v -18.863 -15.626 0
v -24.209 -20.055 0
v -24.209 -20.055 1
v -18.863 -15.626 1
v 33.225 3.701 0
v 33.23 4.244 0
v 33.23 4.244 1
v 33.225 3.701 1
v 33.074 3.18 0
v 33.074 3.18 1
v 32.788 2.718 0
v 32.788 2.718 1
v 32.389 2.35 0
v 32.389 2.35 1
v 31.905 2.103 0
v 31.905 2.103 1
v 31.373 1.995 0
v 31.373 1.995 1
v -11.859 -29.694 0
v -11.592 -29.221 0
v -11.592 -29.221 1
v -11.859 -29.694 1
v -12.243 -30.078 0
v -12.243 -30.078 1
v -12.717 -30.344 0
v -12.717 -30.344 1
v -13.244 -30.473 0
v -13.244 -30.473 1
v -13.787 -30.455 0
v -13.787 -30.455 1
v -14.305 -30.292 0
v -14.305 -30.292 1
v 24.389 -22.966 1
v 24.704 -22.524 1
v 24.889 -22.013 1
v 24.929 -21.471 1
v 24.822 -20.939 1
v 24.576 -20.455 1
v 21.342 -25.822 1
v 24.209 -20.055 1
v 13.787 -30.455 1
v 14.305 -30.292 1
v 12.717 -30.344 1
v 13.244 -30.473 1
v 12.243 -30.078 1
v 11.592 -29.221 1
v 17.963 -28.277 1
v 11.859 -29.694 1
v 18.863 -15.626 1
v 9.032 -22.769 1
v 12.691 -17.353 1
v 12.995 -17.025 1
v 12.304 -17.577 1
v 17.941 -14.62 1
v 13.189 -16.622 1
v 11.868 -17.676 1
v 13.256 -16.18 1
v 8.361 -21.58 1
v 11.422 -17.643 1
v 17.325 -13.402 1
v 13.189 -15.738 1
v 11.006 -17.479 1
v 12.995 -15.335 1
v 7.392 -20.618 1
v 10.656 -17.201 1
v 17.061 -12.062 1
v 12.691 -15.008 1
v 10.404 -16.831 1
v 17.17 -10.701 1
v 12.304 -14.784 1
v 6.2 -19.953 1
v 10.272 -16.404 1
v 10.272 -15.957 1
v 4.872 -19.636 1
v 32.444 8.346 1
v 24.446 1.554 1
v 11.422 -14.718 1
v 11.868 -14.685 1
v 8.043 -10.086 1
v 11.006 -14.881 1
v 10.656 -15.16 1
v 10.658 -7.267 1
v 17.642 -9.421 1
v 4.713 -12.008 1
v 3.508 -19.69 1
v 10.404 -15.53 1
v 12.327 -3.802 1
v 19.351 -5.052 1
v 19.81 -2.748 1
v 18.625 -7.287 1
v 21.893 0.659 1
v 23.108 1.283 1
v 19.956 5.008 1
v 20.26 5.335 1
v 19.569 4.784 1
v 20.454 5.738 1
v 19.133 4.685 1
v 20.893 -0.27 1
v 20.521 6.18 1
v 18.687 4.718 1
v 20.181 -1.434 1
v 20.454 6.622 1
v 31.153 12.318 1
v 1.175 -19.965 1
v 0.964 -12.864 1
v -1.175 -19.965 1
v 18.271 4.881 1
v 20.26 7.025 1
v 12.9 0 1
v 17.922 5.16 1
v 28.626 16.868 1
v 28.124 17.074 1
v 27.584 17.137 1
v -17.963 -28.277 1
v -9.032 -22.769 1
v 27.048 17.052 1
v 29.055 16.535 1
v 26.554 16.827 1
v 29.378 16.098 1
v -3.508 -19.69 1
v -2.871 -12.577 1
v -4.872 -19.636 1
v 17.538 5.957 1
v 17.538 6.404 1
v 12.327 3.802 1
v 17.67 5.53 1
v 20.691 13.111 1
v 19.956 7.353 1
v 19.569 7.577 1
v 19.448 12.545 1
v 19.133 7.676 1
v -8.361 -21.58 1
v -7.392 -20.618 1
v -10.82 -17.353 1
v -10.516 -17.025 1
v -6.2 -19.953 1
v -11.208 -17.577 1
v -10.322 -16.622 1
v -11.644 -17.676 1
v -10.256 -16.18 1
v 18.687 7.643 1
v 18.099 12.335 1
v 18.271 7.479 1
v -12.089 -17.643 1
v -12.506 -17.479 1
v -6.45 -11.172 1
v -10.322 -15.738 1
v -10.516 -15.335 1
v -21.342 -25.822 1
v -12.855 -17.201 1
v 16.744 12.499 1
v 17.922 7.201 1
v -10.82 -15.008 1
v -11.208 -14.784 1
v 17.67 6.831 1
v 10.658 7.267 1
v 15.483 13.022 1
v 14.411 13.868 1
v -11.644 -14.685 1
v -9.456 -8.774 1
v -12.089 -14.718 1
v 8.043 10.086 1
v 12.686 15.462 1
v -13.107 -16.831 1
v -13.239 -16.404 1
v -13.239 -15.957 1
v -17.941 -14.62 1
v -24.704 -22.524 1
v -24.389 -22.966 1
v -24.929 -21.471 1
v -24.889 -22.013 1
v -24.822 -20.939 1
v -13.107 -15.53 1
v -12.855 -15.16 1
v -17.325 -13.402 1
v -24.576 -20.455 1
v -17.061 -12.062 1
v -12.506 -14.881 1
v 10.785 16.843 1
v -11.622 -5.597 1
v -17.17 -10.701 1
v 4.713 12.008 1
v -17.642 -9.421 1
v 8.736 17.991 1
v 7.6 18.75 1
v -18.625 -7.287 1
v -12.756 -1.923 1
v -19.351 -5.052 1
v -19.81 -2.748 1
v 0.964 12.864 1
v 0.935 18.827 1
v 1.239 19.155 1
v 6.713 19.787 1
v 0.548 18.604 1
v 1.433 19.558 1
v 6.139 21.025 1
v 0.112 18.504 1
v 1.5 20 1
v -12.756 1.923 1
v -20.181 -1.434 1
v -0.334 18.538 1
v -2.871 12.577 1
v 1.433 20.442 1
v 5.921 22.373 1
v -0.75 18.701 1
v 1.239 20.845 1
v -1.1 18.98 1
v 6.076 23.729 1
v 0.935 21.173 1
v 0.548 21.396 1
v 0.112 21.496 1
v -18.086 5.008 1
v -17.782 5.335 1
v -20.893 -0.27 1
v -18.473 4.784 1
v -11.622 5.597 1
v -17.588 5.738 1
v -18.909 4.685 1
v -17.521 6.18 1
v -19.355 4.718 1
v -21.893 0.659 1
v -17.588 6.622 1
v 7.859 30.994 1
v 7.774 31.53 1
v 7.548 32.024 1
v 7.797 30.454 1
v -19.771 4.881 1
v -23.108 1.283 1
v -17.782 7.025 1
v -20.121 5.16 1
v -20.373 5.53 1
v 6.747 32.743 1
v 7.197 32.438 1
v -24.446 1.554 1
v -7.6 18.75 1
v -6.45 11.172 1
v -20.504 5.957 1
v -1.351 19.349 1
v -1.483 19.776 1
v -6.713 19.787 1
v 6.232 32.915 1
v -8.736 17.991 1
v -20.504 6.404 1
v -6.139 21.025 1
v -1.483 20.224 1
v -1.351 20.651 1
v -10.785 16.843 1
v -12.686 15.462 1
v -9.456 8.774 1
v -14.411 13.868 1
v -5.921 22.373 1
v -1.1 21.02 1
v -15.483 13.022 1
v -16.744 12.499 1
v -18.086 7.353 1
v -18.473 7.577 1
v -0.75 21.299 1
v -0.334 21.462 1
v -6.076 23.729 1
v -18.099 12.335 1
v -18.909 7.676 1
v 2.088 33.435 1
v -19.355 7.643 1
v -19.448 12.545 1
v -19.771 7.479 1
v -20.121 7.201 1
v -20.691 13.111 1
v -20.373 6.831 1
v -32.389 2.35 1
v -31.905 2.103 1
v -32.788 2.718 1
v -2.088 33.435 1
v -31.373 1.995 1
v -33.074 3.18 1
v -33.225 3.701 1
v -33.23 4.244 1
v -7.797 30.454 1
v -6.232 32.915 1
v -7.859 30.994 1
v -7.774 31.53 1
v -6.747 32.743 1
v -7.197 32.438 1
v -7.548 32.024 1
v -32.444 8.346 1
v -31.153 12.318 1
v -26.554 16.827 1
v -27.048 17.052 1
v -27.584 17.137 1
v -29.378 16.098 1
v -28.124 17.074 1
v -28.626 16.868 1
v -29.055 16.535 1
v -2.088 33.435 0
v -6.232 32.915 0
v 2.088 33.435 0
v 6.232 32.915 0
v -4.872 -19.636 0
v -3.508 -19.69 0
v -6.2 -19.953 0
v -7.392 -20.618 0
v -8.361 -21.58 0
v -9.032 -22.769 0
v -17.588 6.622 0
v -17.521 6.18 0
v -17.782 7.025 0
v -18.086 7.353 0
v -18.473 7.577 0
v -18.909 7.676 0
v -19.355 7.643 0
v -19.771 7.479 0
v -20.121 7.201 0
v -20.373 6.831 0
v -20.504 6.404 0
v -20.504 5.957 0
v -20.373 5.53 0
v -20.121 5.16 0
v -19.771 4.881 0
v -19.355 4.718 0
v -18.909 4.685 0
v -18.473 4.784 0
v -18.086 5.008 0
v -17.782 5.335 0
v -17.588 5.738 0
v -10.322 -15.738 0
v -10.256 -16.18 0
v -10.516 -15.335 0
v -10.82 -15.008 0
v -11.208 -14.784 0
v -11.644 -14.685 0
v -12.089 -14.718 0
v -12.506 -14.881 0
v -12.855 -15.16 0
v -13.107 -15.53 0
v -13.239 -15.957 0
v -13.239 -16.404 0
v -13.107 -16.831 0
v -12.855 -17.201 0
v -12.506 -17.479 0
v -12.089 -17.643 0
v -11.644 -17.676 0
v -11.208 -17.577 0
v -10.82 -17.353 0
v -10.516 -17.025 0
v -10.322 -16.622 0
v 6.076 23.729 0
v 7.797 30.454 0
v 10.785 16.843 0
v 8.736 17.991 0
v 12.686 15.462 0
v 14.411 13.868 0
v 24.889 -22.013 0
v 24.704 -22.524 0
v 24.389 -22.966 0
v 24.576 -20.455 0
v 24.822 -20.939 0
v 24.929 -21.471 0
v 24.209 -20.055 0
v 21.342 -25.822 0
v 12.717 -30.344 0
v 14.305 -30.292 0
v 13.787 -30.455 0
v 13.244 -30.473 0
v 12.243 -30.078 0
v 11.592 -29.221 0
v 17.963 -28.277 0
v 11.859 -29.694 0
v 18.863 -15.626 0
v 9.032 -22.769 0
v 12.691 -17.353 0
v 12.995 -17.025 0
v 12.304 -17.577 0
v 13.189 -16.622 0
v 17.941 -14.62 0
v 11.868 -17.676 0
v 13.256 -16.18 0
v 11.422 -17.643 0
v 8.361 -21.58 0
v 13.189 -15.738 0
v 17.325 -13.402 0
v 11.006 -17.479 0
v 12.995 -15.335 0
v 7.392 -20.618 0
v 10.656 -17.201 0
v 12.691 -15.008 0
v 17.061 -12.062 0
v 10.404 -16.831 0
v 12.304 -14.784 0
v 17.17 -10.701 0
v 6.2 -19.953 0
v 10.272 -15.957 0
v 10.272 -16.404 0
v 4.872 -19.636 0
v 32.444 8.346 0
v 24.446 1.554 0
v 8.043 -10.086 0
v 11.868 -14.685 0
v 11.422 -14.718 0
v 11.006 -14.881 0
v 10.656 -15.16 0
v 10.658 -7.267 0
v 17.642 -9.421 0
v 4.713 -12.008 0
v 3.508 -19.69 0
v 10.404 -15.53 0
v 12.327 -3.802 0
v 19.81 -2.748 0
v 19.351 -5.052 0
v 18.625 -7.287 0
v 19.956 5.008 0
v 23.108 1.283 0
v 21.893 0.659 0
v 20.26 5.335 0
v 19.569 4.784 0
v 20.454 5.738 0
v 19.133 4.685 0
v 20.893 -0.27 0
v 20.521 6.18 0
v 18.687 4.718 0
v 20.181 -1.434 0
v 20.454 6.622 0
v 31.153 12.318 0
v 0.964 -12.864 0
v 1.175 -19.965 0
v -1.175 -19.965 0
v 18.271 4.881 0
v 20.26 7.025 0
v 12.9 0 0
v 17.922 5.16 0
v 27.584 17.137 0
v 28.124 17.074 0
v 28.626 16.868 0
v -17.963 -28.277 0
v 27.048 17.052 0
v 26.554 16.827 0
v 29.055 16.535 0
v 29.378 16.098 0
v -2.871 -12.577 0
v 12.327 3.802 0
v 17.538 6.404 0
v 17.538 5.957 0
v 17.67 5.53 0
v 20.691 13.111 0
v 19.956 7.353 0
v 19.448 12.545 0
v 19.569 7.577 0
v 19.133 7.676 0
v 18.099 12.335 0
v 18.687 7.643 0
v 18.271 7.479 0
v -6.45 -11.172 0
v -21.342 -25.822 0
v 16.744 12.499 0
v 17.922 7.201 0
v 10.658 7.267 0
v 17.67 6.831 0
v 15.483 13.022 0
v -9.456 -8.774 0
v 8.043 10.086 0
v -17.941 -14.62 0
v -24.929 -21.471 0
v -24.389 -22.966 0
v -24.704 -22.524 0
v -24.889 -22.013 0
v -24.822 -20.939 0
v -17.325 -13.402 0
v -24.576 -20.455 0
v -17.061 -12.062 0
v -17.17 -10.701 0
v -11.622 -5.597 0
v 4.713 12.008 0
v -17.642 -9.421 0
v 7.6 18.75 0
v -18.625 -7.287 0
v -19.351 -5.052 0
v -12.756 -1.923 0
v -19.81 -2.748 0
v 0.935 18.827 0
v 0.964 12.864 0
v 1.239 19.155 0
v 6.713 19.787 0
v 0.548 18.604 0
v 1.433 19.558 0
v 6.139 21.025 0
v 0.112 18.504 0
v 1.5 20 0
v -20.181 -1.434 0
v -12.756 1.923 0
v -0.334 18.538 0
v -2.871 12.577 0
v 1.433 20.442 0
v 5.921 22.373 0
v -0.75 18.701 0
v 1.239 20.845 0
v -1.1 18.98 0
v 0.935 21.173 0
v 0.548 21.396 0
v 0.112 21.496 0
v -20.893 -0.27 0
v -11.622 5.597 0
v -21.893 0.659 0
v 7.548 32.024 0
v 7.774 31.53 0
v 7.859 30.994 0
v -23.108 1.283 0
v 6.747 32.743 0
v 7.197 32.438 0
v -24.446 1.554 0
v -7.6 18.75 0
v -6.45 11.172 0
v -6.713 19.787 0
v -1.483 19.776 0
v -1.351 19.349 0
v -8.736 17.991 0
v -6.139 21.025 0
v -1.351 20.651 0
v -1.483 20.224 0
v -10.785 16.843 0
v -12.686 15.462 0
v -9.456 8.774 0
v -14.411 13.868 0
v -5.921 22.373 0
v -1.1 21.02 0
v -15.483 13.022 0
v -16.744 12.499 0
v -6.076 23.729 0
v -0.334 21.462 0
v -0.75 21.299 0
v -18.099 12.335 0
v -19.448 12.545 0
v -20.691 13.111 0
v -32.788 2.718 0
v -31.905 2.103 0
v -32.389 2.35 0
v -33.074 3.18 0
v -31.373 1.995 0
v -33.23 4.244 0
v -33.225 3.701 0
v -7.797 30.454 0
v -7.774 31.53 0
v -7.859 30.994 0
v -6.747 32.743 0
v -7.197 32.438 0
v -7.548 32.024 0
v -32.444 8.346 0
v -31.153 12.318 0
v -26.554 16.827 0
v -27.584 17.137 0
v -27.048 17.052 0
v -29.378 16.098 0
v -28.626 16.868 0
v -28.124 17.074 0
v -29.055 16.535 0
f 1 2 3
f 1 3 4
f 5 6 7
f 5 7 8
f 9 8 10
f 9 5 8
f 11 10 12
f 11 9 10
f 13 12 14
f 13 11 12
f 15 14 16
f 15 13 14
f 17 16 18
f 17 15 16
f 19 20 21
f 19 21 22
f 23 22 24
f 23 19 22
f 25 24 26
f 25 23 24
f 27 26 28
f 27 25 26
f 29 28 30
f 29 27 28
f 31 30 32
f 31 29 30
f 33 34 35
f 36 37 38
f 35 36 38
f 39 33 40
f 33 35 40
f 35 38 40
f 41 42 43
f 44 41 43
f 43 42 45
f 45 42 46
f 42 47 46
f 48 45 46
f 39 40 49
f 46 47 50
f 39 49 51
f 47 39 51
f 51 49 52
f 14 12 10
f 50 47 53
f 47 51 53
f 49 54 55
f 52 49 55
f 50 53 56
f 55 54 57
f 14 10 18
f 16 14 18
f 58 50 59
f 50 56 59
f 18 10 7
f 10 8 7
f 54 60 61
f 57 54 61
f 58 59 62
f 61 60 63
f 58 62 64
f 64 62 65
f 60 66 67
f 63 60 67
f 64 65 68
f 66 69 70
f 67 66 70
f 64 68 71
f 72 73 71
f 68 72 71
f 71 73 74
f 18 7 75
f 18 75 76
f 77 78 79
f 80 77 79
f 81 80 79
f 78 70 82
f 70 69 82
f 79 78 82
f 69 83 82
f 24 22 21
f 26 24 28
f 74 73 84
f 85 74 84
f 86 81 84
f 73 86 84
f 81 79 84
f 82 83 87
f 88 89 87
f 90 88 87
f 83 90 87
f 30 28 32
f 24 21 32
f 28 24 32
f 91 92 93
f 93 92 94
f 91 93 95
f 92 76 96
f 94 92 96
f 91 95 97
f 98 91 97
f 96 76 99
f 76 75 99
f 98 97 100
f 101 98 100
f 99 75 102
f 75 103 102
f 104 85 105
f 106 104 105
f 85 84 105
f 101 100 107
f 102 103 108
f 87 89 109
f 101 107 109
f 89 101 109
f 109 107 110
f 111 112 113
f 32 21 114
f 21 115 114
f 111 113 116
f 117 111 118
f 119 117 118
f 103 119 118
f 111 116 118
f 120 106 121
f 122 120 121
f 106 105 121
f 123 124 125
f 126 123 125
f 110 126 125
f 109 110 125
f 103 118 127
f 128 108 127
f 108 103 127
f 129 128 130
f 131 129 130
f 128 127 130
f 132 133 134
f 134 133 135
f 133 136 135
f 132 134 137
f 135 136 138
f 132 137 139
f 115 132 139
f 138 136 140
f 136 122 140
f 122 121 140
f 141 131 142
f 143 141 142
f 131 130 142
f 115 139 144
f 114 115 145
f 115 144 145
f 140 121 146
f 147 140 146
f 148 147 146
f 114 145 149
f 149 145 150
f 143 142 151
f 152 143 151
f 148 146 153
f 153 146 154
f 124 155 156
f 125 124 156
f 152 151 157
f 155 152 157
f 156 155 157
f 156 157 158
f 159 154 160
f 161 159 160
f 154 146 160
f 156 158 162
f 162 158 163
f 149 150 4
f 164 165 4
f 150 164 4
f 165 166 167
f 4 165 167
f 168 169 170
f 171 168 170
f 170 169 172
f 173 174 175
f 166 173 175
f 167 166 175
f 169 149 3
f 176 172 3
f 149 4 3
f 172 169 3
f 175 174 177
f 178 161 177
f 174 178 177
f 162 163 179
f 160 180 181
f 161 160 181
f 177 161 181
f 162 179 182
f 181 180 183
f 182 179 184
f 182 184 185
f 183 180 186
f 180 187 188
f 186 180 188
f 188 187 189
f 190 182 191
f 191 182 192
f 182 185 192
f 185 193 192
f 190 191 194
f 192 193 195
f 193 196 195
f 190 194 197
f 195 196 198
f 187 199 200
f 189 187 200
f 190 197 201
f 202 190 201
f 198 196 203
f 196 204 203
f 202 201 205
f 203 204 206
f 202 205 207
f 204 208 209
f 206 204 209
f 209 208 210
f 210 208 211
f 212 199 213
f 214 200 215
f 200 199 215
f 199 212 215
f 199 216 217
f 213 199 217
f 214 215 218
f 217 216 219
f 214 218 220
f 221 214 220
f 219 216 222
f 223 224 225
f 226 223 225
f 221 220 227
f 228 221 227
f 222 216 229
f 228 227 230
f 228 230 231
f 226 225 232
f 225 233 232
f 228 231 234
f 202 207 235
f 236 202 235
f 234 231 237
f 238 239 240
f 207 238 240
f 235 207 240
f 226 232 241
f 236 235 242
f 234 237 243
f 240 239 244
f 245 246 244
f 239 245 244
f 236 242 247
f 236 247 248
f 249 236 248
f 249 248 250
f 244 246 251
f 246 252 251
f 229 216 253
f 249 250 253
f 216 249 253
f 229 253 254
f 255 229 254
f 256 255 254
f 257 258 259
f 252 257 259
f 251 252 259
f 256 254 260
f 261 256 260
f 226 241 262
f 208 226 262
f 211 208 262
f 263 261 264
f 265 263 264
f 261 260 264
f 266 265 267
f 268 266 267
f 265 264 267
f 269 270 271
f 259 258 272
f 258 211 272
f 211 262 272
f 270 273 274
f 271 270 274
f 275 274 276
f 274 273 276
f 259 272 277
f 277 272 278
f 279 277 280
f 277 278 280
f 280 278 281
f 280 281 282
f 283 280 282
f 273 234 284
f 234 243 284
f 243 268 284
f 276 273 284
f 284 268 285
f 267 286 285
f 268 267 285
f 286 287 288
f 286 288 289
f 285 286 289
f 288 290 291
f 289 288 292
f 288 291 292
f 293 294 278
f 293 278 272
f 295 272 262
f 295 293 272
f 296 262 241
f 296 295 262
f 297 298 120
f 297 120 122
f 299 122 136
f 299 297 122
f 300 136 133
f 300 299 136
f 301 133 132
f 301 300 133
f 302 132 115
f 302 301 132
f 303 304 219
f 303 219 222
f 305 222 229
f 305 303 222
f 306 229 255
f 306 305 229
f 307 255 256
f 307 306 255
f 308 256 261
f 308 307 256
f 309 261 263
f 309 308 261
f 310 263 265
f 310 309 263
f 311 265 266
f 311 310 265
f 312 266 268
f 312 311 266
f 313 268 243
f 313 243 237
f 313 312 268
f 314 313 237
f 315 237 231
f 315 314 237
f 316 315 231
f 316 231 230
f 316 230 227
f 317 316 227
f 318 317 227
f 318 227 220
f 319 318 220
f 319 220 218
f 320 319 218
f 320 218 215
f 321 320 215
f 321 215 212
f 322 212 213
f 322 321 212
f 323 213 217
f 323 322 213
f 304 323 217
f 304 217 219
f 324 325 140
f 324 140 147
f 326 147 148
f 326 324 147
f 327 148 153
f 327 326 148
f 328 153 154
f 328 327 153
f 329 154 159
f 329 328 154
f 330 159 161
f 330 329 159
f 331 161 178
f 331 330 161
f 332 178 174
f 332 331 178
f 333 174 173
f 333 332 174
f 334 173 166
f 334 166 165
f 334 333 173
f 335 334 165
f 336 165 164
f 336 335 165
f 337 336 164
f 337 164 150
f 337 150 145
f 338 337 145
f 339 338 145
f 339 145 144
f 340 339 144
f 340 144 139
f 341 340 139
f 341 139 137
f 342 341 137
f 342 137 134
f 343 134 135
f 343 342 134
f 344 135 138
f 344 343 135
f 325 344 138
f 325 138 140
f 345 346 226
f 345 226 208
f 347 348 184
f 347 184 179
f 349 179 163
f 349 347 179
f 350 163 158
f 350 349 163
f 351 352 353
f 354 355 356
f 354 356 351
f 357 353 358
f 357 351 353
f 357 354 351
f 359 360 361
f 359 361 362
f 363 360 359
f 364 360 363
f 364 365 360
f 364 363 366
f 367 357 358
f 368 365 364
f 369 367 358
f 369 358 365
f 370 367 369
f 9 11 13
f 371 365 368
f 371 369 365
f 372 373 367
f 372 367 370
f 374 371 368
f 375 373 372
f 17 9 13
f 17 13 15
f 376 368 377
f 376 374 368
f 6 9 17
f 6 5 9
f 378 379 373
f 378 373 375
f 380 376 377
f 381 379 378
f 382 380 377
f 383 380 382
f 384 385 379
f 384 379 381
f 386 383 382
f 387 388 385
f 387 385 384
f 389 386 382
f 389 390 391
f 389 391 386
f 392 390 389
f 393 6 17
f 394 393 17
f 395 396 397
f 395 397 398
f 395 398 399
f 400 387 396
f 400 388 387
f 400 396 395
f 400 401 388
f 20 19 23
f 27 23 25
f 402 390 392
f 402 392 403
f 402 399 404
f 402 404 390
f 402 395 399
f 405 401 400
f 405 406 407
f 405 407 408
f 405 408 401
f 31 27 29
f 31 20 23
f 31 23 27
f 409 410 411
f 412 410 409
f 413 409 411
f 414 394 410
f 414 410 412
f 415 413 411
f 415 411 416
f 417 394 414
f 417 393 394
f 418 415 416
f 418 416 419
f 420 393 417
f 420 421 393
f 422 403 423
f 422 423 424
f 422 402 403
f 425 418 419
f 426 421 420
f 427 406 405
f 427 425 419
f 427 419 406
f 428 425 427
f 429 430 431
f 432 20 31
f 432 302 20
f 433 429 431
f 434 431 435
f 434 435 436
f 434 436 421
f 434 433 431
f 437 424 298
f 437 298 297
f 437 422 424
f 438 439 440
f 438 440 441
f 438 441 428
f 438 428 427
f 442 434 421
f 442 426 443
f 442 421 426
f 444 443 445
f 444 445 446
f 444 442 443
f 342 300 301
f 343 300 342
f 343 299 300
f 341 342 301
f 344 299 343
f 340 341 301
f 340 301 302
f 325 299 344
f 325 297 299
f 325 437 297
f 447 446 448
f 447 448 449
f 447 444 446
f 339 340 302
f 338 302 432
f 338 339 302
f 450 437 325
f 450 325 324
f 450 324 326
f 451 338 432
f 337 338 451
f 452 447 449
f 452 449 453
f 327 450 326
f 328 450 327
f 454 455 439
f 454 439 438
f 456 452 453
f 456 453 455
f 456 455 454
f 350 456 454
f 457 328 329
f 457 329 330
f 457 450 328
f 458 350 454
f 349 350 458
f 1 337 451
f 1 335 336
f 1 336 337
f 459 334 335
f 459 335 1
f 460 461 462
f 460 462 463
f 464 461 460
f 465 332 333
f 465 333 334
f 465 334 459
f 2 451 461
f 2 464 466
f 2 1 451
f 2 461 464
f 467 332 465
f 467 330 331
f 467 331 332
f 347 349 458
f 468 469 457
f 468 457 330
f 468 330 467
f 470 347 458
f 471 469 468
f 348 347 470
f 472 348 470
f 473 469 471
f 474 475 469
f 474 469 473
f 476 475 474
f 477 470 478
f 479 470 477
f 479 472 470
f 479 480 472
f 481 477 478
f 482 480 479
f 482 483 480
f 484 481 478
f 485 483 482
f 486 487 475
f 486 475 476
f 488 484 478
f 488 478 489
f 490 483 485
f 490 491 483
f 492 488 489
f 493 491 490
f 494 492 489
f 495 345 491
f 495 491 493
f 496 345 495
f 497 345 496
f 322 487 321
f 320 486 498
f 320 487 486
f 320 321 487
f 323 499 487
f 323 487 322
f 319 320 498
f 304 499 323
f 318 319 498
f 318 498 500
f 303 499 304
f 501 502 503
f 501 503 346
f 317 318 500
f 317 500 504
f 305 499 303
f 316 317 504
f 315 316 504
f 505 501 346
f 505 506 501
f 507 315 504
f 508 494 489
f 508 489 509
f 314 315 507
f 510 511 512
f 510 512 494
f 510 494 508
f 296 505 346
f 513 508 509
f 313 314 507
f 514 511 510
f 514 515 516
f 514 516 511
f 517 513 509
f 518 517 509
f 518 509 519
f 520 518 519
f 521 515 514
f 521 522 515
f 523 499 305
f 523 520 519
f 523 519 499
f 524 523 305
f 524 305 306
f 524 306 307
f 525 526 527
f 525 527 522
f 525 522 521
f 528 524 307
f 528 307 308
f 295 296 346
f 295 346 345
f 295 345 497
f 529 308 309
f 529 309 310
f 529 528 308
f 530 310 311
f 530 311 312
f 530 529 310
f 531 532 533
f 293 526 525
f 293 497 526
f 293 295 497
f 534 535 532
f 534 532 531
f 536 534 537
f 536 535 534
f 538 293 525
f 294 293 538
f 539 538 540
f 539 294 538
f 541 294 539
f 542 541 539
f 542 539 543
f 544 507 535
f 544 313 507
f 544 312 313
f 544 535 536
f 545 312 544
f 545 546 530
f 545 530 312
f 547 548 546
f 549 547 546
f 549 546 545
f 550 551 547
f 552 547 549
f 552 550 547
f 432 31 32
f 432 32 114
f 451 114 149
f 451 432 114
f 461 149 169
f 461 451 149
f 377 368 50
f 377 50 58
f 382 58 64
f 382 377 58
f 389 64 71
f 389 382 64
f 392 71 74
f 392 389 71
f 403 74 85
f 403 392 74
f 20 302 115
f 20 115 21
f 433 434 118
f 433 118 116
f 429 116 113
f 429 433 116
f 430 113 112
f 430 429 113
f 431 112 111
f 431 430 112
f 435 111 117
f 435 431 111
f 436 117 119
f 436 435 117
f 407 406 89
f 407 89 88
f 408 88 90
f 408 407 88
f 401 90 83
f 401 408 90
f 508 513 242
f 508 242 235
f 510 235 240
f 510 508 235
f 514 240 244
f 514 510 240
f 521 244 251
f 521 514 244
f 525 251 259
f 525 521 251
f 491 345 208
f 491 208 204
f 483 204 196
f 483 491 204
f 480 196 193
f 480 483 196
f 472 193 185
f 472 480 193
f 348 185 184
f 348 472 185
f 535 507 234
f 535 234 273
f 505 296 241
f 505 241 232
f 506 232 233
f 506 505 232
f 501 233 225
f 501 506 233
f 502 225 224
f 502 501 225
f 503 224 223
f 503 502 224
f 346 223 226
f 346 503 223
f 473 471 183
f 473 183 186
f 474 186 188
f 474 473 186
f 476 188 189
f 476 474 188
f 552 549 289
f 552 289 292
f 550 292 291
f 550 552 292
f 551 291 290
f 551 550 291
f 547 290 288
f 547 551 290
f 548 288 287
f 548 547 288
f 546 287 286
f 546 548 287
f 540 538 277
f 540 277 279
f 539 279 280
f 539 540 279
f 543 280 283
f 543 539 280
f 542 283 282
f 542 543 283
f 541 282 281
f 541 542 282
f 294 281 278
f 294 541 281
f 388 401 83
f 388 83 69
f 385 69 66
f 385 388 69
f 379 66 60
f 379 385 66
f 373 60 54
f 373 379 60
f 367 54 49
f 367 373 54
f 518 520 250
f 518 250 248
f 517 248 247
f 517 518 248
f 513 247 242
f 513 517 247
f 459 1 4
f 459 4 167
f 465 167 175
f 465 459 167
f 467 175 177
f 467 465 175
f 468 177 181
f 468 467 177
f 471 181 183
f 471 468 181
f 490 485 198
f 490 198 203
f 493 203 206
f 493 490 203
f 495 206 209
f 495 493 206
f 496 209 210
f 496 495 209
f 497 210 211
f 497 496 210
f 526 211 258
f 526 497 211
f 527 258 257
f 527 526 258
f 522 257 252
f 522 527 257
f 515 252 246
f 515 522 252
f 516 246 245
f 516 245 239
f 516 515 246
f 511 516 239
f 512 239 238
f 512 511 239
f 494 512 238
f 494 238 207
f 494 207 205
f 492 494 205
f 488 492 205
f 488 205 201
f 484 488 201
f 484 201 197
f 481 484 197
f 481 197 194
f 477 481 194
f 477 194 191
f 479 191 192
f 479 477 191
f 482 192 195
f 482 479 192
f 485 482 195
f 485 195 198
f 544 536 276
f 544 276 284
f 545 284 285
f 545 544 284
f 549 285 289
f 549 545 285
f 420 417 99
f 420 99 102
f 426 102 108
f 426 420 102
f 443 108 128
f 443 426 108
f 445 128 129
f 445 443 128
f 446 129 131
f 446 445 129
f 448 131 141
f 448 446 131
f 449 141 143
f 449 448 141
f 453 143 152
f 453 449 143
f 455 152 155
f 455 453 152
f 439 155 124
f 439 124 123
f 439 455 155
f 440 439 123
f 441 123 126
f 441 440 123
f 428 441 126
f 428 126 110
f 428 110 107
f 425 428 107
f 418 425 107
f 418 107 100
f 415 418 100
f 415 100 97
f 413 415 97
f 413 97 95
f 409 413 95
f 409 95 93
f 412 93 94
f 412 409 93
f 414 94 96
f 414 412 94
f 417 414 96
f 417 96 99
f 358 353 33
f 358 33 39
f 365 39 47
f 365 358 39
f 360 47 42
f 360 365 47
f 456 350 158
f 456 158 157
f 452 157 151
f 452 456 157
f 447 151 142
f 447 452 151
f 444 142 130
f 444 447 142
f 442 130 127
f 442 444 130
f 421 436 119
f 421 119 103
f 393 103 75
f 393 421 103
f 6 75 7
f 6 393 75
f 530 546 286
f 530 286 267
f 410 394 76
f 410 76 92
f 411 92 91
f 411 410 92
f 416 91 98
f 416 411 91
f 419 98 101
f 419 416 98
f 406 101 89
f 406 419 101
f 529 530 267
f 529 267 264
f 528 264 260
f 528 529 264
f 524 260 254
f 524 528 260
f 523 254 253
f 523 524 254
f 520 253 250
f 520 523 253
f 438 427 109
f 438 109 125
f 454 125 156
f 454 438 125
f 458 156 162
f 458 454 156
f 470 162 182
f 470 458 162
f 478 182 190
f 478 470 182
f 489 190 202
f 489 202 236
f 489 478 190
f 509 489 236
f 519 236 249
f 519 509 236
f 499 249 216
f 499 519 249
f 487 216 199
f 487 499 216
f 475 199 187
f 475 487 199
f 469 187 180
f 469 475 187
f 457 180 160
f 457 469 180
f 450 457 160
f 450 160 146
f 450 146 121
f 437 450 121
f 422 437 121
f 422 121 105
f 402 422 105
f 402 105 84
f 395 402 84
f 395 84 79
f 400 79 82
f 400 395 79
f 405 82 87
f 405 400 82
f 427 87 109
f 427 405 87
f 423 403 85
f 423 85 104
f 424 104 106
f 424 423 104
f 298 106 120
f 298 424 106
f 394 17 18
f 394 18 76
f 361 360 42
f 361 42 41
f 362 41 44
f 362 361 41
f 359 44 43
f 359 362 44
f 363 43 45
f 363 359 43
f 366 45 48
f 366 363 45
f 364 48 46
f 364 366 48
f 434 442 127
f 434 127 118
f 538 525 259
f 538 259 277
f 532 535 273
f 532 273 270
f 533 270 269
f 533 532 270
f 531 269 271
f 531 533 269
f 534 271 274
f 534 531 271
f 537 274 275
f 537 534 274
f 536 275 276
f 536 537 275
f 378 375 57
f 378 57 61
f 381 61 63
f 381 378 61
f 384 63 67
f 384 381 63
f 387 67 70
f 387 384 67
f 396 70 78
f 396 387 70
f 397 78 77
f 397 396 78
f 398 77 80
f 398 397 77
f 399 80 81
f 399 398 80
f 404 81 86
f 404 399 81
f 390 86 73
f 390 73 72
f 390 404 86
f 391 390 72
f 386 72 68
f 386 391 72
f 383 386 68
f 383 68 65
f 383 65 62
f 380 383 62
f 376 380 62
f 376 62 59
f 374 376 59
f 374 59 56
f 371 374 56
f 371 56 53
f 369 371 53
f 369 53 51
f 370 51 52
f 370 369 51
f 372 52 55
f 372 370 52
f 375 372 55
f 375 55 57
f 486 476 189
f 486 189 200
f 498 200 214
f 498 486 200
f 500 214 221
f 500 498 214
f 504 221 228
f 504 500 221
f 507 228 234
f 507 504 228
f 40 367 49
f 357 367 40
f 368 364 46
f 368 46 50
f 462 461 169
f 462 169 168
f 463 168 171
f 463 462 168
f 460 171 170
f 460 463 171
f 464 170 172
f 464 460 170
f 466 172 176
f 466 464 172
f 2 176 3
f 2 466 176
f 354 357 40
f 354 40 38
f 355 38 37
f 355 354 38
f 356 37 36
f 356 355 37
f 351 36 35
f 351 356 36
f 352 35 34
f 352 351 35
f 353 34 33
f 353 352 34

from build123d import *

# Parameters (mm, degrees)
SKETCH_1_R      = 12.9
SKETCH_1_R_2    = 1.5
EXTRUDE_1_DEPTH = 1


with BuildPart() as part:
    # 草图1 → 凸台-拉伸1 (new body)
    with BuildSketch(Plane.XY):
        with BuildLine():
            Line((-24.208730048, -20.05461018), (-18.863150132, -15.626310092))
            ThreePointArc((-18.863150132, -15.626310092), (-17.146898547, -12.74106365), (-17.642285858, -9.420708556))
            ThreePointArc((-17.642285858, -9.420708556), (-19.021130326, -6.180339887), (-19.810262634, -2.748362124))
            ThreePointArc((-19.810262634, -2.748362124), (-21.361141637, 0.229042931), (-24.445523644, 1.554468964))
            Line((-24.445523644, 1.554468964), (-31.373078125, 1.994985952))
            ThreePointArc((-31.373078125, 1.994985952), (-32.788486399, 2.717684101), (-33.230039203, 4.244348542))
            ThreePointArc((-33.230039203, 4.244348542), (-31.860393296, 10.352069312), (-29.378431918, 16.098376876))
            ThreePointArc((-29.378431918, 16.098376876), (-28.123857351, 17.073936127), (-26.55397669, 16.826655102))
            Line((-26.55397669, 16.826655102), (-20.690537997, 13.111126473))
            ThreePointArc((-20.690537997, 13.111126473), (-17.41615466, 12.370464403), (-14.41139241, 13.867651885))
            ThreePointArc((-14.41139241, 13.867651885), (-11.755705046, 16.180339888), (-8.735555524, 17.991388765))
            ThreePointArc((-8.735555524, 17.991388765), (-6.383123013, 20.386431107), (-6.075694405, 23.729431883))
            Line((-6.075694405, 23.729431883), (-7.797469917, 30.45405495))
            ThreePointArc((-7.797469917, 30.45405495), (-7.547528343, 32.023514221), (-6.232031499, 32.915221151))
            ThreePointArc((-6.232031499, 32.915221151), (0, 33.5), (6.232031499, 32.915221151))
            ThreePointArc((6.232031499, 32.915221151), (7.547528343, 32.023514221), (7.797469917, 30.45405495))
            Line((7.797469917, 30.45405495), (6.075694405, 23.729431883))
            ThreePointArc((6.075694405, 23.729431883), (6.383123013, 20.386431107), (8.735555524, 17.991388765))
            ThreePointArc((8.735555524, 17.991388765), (11.755705046, 16.180339887), (14.41139241, 13.867651885))
            ThreePointArc((14.41139241, 13.867651885), (17.41615466, 12.370464403), (20.690537997, 13.111126473))
            Line((20.690537997, 13.111126473), (26.55397669, 16.826655102))
            ThreePointArc((26.55397669, 16.826655102), (28.123857351, 17.073936127), (29.378431918, 16.098376876))
            ThreePointArc((29.378431918, 16.098376876), (31.860393296, 10.352069312), (33.230039203, 4.244348542))
            ThreePointArc((33.230039203, 4.244348542), (32.788486399, 2.717684101), (31.373078125, 1.994985952))
            Line((31.373078125, 1.994985952), (24.445523644, 1.554468964))
            ThreePointArc((24.445523644, 1.554468964), (21.361141637, 0.229042931), (19.810262634, -2.748362124))
            ThreePointArc((19.810262634, -2.748362124), (19.021130326, -6.180339888), (17.642285858, -9.420708556))
            ThreePointArc((17.642285858, -9.420708556), (17.146898547, -12.74106365), (18.863150132, -15.626310092))
            Line((18.863150132, -15.626310092), (24.208730048, -20.05461018))
            ThreePointArc((24.208730048, -20.05461018), (24.929028081, -21.471241373), (24.388900961, -22.965877077))
            ThreePointArc((24.388900961, -22.965877077), (19.690805952, -27.102069312), (14.305262176, -30.292069492))
            ThreePointArc((14.305262176, -30.292069492), (12.71687069, -30.343893076), (11.592158696, -29.221085825))
            Line((11.592158696, -29.221085825), (9.03247008, -22.768717229))
            ThreePointArc((9.03247008, -22.768717229), (6.818788557, -20.244874791), (3.50786011, -19.689969971))
            ThreePointArc((3.50786011, -19.689969971), (0, -20), (-3.50786011, -19.689969971))
            ThreePointArc((-3.50786011, -19.689969971), (-6.818788557, -20.244874791), (-9.03247008, -22.768717229))
            Line((-9.03247008, -22.768717229), (-11.592158696, -29.221085825))
            ThreePointArc((-11.592158696, -29.221085825), (-12.71687069, -30.343893076), (-14.305262176, -30.292069492))
            ThreePointArc((-14.305262176, -30.292069492), (-19.690805952, -27.102069312), (-24.388900961, -22.965877077))
            ThreePointArc((-24.388900961, -22.965877077), (-24.929028081, -21.471241373), (-24.208730048, -20.05461018))
        make_face()
        Circle(SKETCH_1_R, mode=Mode.SUBTRACT)
        with Locations((-11.755705046, -16.180339887)):
            Circle(SKETCH_1_R_2, mode=Mode.SUBTRACT)
        with Locations((-19.021130326, 6.180339888)):
            Circle(SKETCH_1_R_2, mode=Mode.SUBTRACT)
        with Locations((0, 20)):
            Circle(SKETCH_1_R_2, mode=Mode.SUBTRACT)
        with Locations((19.021130326, 6.180339887)):
            Circle(SKETCH_1_R_2, mode=Mode.SUBTRACT)
        with Locations((11.755705046, -16.180339888)):
            Circle(SKETCH_1_R_2, mode=Mode.SUBTRACT)
    extrude(amount=EXTRUDE_1_DEPTH)


solid = part.part
